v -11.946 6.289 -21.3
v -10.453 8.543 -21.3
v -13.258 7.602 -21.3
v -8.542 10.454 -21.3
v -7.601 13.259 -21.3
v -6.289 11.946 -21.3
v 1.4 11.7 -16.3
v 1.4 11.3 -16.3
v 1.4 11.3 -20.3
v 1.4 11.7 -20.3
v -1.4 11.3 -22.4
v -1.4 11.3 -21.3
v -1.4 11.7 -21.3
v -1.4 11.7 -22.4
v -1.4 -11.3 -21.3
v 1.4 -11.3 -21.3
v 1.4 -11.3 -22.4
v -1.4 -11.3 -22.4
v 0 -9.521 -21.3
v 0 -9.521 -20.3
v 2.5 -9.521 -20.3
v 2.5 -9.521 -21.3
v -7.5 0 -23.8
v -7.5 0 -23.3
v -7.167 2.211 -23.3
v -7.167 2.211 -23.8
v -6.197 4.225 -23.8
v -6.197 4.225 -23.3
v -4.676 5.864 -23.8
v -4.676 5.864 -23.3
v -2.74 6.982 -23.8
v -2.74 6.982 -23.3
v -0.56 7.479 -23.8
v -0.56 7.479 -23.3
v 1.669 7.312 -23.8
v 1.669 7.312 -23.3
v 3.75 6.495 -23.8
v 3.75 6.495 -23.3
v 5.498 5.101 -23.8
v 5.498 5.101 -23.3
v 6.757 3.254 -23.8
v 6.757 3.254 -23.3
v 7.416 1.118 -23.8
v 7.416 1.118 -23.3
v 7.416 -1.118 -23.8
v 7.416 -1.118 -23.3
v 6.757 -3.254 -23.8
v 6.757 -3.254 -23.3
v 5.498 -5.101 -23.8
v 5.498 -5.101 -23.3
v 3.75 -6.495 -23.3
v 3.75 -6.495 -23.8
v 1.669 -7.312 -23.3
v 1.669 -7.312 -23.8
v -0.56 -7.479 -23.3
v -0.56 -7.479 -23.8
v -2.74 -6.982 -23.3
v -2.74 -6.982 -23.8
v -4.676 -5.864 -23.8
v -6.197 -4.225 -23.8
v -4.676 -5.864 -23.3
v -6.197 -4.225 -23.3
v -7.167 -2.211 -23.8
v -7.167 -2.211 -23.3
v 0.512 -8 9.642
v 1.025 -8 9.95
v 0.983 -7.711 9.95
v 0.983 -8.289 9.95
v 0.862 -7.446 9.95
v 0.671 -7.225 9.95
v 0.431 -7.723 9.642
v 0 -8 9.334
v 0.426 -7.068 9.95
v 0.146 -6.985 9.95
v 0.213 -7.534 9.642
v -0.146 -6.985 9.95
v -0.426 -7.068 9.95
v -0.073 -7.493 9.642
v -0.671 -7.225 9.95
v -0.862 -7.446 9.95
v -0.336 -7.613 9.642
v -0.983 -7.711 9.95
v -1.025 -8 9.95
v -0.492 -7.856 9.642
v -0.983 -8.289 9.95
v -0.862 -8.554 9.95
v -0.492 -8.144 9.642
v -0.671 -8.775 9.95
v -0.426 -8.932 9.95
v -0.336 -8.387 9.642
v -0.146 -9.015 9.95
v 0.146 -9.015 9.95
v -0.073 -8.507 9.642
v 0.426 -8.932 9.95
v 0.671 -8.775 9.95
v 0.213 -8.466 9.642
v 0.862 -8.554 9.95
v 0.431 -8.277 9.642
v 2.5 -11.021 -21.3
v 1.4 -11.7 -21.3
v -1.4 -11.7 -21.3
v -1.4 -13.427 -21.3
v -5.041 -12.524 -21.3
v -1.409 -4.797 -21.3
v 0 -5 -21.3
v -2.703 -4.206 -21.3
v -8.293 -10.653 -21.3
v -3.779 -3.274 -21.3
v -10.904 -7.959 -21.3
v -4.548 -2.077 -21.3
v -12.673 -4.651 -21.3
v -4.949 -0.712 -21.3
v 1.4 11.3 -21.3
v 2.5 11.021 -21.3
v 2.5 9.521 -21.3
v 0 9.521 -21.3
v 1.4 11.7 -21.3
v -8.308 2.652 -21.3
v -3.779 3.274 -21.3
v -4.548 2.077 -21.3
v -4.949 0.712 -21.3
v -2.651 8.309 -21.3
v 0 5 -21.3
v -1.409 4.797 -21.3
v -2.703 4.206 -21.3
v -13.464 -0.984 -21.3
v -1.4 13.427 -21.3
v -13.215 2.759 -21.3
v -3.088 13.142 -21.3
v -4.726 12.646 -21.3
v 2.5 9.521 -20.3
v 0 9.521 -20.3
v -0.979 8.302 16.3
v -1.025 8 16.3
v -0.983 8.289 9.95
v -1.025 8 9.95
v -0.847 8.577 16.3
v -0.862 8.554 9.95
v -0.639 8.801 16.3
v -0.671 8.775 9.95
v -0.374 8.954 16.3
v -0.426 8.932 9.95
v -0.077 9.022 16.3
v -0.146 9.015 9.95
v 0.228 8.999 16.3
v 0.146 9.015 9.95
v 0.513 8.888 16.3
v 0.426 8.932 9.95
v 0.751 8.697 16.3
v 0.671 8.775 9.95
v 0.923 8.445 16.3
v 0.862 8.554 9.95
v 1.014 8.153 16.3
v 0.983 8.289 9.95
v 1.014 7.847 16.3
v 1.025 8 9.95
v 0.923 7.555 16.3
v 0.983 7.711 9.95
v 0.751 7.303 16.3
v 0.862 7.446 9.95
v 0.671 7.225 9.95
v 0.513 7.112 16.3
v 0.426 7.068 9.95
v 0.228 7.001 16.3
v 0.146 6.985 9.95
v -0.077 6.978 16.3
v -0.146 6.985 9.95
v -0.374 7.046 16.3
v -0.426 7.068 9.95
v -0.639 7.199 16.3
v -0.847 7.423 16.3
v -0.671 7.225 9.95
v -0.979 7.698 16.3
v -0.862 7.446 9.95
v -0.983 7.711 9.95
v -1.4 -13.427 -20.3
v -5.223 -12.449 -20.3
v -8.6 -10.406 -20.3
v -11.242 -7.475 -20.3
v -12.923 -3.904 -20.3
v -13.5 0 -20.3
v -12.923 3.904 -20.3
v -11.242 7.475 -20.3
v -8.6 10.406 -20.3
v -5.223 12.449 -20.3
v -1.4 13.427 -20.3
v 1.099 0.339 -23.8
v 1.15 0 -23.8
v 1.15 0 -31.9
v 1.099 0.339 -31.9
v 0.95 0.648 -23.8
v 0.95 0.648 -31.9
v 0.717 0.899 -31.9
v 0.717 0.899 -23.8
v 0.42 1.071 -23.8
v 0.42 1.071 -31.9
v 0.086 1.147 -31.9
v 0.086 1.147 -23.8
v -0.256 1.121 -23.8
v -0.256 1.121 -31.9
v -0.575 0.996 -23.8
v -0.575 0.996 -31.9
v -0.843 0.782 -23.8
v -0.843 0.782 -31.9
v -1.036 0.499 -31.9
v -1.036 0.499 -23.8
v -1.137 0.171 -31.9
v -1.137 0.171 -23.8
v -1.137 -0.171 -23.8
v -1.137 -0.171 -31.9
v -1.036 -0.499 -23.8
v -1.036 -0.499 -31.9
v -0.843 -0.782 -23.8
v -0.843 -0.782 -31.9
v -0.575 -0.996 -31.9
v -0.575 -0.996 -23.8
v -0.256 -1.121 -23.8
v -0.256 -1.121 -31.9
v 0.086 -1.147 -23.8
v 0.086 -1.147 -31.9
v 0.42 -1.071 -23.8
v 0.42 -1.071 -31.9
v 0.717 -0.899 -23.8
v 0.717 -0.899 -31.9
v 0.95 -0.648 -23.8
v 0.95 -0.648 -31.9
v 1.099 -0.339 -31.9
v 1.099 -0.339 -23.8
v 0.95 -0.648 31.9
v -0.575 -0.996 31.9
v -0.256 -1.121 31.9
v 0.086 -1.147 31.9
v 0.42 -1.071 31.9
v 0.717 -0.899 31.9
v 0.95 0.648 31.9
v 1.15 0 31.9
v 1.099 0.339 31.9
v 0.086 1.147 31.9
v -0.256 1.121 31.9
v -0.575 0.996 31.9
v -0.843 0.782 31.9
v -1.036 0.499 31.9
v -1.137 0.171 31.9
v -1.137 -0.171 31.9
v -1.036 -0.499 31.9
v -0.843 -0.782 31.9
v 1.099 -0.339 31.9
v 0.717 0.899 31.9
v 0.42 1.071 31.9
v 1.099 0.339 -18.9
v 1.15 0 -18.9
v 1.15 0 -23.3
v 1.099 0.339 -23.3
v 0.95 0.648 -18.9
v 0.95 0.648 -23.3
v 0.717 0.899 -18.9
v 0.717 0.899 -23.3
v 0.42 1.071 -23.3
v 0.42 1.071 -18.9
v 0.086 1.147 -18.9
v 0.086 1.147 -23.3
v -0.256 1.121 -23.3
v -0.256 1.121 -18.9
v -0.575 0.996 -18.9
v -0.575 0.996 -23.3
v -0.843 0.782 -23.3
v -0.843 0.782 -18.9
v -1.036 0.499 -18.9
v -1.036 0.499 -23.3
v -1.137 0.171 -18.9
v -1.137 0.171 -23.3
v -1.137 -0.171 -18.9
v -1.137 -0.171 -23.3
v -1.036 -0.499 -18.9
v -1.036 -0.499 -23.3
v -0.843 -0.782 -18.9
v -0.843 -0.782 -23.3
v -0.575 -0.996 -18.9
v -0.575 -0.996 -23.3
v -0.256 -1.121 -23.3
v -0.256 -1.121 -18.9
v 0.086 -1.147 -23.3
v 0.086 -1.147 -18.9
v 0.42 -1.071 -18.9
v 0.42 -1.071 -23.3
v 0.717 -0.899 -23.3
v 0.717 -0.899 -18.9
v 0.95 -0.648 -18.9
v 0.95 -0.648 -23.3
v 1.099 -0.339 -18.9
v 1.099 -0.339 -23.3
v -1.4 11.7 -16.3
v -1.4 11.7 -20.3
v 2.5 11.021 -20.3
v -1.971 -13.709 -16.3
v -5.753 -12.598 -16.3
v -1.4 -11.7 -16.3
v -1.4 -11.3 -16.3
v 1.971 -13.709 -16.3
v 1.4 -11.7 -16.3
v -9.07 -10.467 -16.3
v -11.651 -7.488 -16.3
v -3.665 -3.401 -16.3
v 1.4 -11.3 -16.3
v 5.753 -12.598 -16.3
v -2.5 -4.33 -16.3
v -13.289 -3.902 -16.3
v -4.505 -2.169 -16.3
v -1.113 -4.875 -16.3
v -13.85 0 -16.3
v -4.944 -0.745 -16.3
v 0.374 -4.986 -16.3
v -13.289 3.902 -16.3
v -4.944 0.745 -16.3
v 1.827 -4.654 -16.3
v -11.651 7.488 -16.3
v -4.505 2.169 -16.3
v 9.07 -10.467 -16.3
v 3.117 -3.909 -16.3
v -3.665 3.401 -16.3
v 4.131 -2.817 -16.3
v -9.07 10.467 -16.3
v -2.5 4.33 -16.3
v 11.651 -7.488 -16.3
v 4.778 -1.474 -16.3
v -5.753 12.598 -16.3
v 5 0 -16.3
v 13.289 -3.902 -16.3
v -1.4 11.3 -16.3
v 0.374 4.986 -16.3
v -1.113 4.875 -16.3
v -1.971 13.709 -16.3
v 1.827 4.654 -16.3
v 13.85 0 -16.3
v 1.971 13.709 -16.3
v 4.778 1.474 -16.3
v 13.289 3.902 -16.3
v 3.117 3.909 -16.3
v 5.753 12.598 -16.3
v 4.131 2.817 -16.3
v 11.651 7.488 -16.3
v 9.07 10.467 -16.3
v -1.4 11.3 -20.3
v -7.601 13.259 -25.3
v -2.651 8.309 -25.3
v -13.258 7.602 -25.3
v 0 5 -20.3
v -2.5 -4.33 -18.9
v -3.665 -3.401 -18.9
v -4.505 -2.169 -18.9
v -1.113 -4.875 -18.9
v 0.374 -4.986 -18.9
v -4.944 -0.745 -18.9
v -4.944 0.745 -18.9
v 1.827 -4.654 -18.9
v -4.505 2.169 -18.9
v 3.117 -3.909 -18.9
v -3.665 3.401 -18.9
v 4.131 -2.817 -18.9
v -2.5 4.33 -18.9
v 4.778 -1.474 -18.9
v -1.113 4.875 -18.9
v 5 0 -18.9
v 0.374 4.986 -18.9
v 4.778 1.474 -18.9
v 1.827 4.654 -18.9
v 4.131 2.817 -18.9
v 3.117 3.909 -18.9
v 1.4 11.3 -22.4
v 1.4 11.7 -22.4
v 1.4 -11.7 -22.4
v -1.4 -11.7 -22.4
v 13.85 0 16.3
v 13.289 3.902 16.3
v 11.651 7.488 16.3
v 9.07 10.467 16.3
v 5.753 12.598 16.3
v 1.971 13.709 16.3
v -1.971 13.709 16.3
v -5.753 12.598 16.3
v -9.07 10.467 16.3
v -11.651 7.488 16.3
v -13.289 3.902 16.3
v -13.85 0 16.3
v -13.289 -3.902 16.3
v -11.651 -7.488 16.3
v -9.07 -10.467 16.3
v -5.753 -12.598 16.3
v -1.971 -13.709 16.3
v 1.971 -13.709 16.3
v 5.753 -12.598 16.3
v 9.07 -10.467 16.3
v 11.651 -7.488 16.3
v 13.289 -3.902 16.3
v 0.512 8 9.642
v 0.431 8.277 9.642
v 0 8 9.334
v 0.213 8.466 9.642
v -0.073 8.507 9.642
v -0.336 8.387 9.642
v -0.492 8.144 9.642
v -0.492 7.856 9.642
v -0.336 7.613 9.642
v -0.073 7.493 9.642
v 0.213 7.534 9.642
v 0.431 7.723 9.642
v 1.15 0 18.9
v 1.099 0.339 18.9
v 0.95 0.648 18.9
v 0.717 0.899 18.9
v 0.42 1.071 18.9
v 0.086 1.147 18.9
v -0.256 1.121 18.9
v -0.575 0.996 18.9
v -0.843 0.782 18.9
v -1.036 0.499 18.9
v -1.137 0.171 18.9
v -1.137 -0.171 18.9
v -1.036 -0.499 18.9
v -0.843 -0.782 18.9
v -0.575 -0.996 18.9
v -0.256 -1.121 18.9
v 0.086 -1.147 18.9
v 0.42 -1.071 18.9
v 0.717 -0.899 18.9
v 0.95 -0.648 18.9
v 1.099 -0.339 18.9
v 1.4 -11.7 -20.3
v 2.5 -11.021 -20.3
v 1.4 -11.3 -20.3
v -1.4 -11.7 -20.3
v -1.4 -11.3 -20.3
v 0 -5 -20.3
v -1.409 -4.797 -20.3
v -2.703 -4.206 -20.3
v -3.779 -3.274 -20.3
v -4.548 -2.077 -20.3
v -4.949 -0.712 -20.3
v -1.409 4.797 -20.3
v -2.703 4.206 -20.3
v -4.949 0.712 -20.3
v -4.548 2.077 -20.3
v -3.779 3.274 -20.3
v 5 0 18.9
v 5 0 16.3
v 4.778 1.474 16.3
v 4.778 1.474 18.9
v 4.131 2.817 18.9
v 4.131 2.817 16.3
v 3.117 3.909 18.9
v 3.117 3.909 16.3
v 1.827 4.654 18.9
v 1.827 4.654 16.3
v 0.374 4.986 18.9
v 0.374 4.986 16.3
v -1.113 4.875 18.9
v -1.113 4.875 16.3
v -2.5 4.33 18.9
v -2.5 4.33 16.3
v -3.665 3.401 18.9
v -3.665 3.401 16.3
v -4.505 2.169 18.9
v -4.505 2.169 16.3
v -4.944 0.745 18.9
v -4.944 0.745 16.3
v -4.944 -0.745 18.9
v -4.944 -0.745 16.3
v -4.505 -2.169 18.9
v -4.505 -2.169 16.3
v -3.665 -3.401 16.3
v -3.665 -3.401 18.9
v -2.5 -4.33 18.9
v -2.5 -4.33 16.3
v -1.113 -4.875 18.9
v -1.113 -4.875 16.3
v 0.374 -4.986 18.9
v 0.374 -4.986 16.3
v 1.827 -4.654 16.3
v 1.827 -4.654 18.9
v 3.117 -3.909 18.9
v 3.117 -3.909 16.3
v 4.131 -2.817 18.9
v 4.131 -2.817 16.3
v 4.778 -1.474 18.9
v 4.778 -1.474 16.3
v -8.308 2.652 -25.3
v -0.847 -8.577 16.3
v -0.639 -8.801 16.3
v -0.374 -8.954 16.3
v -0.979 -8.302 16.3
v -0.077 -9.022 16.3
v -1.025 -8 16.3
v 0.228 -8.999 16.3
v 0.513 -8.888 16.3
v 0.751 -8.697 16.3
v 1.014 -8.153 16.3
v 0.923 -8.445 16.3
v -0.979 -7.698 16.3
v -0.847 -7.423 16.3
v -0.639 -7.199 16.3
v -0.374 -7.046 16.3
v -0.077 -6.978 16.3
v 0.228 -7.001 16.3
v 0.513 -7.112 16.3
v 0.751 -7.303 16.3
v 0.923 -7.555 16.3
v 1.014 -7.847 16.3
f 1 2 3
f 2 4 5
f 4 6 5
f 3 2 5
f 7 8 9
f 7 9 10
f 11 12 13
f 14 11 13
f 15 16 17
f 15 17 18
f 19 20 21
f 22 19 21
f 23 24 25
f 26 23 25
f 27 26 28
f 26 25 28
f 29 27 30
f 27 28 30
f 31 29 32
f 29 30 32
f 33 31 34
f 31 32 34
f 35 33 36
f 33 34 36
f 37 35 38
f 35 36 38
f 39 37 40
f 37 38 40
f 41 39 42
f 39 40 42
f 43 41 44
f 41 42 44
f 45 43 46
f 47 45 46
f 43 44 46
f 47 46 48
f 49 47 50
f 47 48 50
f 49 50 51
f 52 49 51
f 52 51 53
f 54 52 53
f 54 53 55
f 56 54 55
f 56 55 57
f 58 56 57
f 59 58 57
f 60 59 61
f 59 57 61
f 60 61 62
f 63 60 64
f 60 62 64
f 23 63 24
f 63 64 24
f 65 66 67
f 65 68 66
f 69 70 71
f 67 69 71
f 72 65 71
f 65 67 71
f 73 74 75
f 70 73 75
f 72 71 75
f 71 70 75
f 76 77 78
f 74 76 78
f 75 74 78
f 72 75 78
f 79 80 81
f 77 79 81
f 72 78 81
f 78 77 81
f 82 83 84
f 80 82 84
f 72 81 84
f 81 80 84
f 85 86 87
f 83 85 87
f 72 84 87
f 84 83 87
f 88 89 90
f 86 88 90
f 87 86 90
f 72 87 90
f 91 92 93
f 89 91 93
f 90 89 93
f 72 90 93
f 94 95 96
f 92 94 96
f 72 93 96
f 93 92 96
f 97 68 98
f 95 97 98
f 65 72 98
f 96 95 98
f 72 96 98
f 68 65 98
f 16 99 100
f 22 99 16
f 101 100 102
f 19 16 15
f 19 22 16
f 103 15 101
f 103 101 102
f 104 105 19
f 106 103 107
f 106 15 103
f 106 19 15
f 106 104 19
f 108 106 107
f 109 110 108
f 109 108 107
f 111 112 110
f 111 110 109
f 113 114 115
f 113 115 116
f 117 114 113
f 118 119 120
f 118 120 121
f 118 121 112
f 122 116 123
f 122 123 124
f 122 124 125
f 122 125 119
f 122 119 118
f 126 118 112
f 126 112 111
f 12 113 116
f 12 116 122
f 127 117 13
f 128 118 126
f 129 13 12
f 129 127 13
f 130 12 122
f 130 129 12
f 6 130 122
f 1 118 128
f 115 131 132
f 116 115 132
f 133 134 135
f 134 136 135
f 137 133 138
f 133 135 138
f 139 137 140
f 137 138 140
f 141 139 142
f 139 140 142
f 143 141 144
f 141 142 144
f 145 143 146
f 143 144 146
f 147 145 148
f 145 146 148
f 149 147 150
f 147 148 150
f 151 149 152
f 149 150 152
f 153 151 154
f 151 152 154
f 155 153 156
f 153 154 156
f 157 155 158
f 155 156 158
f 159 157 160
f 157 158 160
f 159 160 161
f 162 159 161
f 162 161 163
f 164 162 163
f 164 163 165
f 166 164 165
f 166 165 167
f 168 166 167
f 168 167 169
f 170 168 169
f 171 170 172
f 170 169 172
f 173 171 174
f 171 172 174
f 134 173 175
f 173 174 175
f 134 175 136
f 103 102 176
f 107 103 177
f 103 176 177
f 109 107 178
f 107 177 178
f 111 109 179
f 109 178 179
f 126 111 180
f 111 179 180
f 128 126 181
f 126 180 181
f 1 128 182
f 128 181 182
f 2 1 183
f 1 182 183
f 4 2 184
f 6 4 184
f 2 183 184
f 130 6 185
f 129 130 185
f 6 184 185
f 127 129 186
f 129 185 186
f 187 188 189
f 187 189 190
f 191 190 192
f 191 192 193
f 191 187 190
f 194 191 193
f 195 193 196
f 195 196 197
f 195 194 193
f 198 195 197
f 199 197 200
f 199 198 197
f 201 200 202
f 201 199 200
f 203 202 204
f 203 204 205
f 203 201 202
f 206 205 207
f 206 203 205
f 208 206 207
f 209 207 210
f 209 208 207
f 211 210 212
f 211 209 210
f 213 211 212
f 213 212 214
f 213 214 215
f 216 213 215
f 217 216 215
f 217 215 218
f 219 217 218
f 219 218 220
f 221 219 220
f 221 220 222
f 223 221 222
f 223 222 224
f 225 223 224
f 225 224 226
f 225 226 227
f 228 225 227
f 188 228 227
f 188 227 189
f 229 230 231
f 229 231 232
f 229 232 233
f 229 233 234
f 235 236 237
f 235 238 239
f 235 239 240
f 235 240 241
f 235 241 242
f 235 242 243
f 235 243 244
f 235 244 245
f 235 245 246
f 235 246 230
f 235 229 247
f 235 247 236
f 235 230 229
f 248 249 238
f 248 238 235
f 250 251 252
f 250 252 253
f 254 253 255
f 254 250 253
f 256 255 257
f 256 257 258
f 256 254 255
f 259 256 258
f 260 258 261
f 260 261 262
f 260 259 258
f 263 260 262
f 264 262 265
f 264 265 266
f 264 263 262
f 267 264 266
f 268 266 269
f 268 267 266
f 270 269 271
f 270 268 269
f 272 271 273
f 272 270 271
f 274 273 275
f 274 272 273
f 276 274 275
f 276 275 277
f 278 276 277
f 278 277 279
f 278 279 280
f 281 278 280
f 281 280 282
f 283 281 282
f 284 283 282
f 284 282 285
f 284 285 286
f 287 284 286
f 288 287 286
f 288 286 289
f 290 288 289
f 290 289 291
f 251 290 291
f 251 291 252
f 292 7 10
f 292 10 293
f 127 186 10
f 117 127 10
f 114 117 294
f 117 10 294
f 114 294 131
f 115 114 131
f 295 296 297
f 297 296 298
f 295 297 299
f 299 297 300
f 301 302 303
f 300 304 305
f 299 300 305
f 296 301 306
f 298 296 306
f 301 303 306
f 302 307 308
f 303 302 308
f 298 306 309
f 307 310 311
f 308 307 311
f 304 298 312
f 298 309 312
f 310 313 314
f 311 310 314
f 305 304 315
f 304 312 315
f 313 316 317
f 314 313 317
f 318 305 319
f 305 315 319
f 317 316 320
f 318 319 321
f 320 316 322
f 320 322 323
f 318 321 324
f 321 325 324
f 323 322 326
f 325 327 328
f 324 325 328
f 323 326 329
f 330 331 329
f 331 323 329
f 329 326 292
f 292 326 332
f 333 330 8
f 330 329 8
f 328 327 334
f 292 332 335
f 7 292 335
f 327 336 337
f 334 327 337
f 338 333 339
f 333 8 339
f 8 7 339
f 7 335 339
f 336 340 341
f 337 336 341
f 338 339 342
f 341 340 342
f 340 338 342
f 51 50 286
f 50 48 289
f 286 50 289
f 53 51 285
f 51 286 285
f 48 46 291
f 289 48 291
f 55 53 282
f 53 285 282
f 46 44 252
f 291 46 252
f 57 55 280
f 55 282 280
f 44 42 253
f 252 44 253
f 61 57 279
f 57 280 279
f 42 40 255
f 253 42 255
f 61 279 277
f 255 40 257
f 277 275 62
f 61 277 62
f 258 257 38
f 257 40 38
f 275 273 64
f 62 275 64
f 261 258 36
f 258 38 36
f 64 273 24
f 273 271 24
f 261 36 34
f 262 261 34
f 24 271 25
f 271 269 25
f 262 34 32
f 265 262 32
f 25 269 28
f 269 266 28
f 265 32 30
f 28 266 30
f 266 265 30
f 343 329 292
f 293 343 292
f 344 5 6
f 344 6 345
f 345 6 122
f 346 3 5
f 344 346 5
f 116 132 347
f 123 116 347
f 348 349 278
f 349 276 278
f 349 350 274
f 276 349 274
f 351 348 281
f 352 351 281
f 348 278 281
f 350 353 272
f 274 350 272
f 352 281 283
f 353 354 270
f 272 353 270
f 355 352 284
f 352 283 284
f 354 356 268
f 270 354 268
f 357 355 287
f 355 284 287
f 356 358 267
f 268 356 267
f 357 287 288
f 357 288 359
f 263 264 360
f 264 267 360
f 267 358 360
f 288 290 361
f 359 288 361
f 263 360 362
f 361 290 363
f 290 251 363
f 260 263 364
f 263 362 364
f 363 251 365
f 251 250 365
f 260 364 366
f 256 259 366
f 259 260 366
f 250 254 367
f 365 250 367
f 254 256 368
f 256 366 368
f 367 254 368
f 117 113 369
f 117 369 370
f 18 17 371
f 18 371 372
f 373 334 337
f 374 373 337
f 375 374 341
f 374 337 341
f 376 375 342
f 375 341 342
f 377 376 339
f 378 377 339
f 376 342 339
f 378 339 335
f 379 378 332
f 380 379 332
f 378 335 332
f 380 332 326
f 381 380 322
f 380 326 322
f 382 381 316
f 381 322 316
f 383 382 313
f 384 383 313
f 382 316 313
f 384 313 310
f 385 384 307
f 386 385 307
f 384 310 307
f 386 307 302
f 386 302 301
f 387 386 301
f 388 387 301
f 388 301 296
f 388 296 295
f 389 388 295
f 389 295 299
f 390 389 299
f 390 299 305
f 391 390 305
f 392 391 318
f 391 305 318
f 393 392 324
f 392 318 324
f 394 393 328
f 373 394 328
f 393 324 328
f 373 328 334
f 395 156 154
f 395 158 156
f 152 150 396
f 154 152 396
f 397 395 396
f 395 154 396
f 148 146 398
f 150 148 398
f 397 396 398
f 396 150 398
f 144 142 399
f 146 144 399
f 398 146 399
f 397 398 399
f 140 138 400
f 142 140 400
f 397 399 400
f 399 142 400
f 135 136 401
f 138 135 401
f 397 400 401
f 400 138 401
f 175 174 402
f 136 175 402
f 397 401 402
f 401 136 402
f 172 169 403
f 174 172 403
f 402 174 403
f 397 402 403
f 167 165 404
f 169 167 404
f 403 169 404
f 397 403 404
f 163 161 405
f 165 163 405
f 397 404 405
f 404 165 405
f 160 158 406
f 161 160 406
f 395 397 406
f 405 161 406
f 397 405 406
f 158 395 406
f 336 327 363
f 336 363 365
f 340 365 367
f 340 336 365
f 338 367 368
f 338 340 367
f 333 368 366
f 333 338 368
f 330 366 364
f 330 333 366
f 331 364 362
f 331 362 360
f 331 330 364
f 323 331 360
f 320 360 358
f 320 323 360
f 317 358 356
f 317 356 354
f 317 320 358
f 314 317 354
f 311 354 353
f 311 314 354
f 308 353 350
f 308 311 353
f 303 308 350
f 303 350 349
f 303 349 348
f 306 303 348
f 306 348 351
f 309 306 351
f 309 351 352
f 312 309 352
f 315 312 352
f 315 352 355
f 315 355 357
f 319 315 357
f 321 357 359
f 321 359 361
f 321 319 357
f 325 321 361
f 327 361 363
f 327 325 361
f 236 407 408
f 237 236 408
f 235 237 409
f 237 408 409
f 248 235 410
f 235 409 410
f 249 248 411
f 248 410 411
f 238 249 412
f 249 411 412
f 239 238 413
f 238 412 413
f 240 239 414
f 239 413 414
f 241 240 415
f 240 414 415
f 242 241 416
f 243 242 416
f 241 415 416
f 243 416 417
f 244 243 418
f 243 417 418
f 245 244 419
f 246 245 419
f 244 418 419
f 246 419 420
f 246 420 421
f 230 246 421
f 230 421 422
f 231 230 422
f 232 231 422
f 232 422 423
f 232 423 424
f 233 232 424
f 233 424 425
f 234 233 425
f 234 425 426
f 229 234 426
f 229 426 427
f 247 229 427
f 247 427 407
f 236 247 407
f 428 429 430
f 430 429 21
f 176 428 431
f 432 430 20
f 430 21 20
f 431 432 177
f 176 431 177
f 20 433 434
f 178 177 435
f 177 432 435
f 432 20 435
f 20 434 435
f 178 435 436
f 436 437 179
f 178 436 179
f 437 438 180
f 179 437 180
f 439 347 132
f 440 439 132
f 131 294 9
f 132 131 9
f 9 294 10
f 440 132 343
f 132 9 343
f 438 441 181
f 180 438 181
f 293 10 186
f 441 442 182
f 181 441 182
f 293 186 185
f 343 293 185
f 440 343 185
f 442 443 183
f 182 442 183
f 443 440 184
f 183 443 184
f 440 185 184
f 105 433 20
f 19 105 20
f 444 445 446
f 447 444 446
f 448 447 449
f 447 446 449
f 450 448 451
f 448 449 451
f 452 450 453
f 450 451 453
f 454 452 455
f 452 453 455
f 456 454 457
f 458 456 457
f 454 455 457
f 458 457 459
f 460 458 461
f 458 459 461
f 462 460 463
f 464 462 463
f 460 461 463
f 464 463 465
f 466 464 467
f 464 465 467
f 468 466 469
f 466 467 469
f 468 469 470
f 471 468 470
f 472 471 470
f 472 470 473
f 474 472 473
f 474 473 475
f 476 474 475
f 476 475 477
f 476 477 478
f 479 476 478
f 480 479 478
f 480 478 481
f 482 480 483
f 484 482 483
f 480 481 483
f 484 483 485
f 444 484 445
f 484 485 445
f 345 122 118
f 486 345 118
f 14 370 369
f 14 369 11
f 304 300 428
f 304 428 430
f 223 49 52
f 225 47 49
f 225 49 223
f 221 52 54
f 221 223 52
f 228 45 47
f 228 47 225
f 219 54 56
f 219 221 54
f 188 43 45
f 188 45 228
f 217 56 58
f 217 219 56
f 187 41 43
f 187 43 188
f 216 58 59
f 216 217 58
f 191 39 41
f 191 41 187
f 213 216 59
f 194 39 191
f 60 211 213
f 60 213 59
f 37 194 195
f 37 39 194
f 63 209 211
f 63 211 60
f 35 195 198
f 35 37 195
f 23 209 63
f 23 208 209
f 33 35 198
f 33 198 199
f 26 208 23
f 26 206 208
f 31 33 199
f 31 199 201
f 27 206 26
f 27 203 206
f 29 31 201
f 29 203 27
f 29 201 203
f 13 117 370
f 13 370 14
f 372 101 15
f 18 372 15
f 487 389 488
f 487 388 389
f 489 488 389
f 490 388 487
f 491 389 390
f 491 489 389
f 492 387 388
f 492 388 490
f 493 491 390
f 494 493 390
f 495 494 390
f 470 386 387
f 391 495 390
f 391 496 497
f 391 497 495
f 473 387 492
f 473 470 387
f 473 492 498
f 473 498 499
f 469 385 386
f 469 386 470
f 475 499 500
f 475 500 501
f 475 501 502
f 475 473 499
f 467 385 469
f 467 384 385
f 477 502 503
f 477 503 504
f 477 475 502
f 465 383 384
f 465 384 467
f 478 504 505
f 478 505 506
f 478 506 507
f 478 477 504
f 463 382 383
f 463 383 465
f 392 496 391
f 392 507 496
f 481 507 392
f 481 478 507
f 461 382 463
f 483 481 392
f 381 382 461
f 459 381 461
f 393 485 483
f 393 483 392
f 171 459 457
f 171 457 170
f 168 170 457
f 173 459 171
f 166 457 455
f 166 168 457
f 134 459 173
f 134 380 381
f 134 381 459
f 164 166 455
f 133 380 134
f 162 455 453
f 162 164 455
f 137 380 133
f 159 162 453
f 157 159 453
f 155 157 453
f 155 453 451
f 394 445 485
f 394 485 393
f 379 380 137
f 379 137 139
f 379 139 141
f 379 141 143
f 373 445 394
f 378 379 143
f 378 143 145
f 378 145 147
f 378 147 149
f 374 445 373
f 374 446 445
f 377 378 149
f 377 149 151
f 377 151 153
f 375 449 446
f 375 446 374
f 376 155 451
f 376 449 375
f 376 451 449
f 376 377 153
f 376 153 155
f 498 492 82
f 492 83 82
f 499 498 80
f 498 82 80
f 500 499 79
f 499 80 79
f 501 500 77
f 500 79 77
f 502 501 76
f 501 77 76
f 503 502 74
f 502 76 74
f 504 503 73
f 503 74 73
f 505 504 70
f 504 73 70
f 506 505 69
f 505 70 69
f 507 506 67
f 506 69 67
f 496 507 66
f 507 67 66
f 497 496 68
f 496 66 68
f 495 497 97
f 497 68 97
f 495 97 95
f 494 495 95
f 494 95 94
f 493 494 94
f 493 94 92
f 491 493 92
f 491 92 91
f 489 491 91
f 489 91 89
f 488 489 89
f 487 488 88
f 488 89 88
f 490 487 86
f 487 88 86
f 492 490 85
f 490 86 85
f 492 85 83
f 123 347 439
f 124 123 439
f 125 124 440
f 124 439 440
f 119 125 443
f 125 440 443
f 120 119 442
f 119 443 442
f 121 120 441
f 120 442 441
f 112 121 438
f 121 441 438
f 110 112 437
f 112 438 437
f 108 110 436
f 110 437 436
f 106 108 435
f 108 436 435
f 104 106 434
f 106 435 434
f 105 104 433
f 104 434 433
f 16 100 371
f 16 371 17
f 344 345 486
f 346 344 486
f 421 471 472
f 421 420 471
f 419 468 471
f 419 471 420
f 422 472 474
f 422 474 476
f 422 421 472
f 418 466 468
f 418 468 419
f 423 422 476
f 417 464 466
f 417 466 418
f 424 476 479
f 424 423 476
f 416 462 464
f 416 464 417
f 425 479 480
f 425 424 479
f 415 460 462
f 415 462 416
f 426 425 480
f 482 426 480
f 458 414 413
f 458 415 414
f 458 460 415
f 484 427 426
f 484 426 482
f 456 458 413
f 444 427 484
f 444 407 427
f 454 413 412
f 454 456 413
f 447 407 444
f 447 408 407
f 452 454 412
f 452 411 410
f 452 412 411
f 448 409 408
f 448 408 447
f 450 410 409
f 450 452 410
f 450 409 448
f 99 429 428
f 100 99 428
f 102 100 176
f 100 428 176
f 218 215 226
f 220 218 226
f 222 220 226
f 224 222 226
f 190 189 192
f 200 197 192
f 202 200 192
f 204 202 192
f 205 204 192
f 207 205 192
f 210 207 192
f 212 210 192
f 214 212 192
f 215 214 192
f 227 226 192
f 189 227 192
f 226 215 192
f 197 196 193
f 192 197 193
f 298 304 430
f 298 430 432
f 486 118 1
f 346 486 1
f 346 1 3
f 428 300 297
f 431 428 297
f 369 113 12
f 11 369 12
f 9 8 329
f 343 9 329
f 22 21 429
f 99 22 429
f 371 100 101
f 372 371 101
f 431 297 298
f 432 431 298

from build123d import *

# Parameters (mm, degrees)
MAINBODY_DEPTH               = 16.3
MAINBODY_DEPTH_BACK          = 16.3
SKETCH1_R                    = 13.85
SKETCH2_R                    = 1.15
OUTPUTSHAFT_DEPTH            = 15.6
SKETCH2_3_R                  = 5
SKETCH2_3_R_2                = 1.15
OUTPUTBOSS_DEPTH             = 2.6
M2_5X0_45_TAPPED_HOLE1_D     = 2.05
M2_5X0_45_TAPPED_HOLE1_DEPTH = 6.35
M2_5X0_45_TAPPED_HOLE1_TIP   = 0.615882135
SKETCH5_W                    = 2.8
SKETCH5_H                    = 0.4
TERMINALS_DEPTH              = 6.1
PCB_START                    = 4
PCB_DEPTH                    = 1
ENCODER_START                = 7
SKETCH9_R                    = 7.5
ENCODER_DEPTH                = 0.5
CONNECTOR_DEPTH              = 4


with BuildPart() as part:
    # Sketch1 → MAINBODY (new, two sides: drawn at the far end of the back side and taken through both)
    with BuildSketch(Plane.XY.offset(-MAINBODY_DEPTH_BACK)):
        Circle(SKETCH1_R)
    extrude(amount=MAINBODY_DEPTH + MAINBODY_DEPTH_BACK)

    # Sketch2 → OUTPUTSHAFT (add)
    with BuildSketch(Plane.XY.offset(16.3)):
        Circle(SKETCH2_R)
    outputshaft = extrude(amount=OUTPUTSHAFT_DEPTH)

    # Sketch2<3> → OUTPUTBOSS (add)
    with BuildSketch(Plane.XY.offset(16.3)):
        Circle(SKETCH2_3_R)
        Circle(SKETCH2_3_R_2, mode=Mode.SUBTRACT)
    outputboss = extrude(amount=OUTPUTBOSS_DEPTH)

    # M2.5x0.45 Tapped Hole1
    with Locations(Plane.XY.offset(16.3)):
        with Locations((0, 8), (0, -8)):
            Hole(M2_5X0_45_TAPPED_HOLE1_D / 2, depth=M2_5X0_45_TAPPED_HOLE1_DEPTH)
            with Locations((0, 0, -(M2_5X0_45_TAPPED_HOLE1_DEPTH + M2_5X0_45_TAPPED_HOLE1_TIP / 2))):  # 118° drill point
                Cone(0, M2_5X0_45_TAPPED_HOLE1_D / 2, M2_5X0_45_TAPPED_HOLE1_TIP, mode=Mode.SUBTRACT)

    # REARSHAFT: OUTPUTSHAFT, OUTPUTBOSS across plane
    add(outputshaft.mirror(Plane.XY))
    add(outputboss.mirror(Plane.XY))

    # Sketch5 → TERMINALS (add)
    with BuildSketch(Plane(origin=(0, 0, -16.3), x_dir=(-1, 0, 0), z_dir=(0, 0, -1))):
        with Locations((0, 11.5)):
            Rectangle(SKETCH5_W, SKETCH5_H)
        with Locations((0, -11.5)):
            Rectangle(SKETCH5_W, SKETCH5_H)
    extrude(amount=TERMINALS_DEPTH)

    # Sketch8 → PCB (add)
    with BuildSketch(Plane(origin=(0, 0, -16.3), x_dir=(-1, 0, 0), z_dir=(0, 0, -1)).offset(PCB_START)):
        with BuildLine():
            Line((1.4, 13.427211177), (-2.5, 11.021452752))
            Line((-2.5, 11.021452752), (-2.5, 9.521452752))
            Line((-2.5, 9.521452752), (0, 9.521452752))
            Line((0, 9.521452752), (0, 5))
            ThreePointArc((0, 5), (5, 0), (0, -5))
            Line((0, -5), (0, -9.521452752))
            Line((0, -9.521452752), (-2.5, -9.521452752))
            Line((-2.5, -9.521452752), (-2.5, -11.021452752))
            Line((-2.5, -11.021452752), (1.4, -13.427211177))
            ThreePointArc((1.4, -13.427211177), (13.5, 0), (1.4, 13.427211177))
        make_face()
    extrude(amount=PCB_DEPTH)

    # Sketch9 → ENCODER (add)
    with BuildSketch(Plane(origin=(0, 0, -16.3), x_dir=(-1, 0, 0), z_dir=(0, 0, -1)).offset(ENCODER_START)):
        Circle(SKETCH9_R)
    extrude(amount=ENCODER_DEPTH)

    # Sketch10 → CONNECTOR (add)
    with BuildSketch(Plane(origin=(0, 0, -21.3), x_dir=(-1, 0, 0), z_dir=(0, 0, -1))):
        Polygon((2.651397898, 8.308757211), (8.308252147, 2.651902961), (13.257999616, 7.601650429), (7.601145366, 13.258504679), align=None)
    extrude(amount=CONNECTOR_DEPTH)


solid = part.part
